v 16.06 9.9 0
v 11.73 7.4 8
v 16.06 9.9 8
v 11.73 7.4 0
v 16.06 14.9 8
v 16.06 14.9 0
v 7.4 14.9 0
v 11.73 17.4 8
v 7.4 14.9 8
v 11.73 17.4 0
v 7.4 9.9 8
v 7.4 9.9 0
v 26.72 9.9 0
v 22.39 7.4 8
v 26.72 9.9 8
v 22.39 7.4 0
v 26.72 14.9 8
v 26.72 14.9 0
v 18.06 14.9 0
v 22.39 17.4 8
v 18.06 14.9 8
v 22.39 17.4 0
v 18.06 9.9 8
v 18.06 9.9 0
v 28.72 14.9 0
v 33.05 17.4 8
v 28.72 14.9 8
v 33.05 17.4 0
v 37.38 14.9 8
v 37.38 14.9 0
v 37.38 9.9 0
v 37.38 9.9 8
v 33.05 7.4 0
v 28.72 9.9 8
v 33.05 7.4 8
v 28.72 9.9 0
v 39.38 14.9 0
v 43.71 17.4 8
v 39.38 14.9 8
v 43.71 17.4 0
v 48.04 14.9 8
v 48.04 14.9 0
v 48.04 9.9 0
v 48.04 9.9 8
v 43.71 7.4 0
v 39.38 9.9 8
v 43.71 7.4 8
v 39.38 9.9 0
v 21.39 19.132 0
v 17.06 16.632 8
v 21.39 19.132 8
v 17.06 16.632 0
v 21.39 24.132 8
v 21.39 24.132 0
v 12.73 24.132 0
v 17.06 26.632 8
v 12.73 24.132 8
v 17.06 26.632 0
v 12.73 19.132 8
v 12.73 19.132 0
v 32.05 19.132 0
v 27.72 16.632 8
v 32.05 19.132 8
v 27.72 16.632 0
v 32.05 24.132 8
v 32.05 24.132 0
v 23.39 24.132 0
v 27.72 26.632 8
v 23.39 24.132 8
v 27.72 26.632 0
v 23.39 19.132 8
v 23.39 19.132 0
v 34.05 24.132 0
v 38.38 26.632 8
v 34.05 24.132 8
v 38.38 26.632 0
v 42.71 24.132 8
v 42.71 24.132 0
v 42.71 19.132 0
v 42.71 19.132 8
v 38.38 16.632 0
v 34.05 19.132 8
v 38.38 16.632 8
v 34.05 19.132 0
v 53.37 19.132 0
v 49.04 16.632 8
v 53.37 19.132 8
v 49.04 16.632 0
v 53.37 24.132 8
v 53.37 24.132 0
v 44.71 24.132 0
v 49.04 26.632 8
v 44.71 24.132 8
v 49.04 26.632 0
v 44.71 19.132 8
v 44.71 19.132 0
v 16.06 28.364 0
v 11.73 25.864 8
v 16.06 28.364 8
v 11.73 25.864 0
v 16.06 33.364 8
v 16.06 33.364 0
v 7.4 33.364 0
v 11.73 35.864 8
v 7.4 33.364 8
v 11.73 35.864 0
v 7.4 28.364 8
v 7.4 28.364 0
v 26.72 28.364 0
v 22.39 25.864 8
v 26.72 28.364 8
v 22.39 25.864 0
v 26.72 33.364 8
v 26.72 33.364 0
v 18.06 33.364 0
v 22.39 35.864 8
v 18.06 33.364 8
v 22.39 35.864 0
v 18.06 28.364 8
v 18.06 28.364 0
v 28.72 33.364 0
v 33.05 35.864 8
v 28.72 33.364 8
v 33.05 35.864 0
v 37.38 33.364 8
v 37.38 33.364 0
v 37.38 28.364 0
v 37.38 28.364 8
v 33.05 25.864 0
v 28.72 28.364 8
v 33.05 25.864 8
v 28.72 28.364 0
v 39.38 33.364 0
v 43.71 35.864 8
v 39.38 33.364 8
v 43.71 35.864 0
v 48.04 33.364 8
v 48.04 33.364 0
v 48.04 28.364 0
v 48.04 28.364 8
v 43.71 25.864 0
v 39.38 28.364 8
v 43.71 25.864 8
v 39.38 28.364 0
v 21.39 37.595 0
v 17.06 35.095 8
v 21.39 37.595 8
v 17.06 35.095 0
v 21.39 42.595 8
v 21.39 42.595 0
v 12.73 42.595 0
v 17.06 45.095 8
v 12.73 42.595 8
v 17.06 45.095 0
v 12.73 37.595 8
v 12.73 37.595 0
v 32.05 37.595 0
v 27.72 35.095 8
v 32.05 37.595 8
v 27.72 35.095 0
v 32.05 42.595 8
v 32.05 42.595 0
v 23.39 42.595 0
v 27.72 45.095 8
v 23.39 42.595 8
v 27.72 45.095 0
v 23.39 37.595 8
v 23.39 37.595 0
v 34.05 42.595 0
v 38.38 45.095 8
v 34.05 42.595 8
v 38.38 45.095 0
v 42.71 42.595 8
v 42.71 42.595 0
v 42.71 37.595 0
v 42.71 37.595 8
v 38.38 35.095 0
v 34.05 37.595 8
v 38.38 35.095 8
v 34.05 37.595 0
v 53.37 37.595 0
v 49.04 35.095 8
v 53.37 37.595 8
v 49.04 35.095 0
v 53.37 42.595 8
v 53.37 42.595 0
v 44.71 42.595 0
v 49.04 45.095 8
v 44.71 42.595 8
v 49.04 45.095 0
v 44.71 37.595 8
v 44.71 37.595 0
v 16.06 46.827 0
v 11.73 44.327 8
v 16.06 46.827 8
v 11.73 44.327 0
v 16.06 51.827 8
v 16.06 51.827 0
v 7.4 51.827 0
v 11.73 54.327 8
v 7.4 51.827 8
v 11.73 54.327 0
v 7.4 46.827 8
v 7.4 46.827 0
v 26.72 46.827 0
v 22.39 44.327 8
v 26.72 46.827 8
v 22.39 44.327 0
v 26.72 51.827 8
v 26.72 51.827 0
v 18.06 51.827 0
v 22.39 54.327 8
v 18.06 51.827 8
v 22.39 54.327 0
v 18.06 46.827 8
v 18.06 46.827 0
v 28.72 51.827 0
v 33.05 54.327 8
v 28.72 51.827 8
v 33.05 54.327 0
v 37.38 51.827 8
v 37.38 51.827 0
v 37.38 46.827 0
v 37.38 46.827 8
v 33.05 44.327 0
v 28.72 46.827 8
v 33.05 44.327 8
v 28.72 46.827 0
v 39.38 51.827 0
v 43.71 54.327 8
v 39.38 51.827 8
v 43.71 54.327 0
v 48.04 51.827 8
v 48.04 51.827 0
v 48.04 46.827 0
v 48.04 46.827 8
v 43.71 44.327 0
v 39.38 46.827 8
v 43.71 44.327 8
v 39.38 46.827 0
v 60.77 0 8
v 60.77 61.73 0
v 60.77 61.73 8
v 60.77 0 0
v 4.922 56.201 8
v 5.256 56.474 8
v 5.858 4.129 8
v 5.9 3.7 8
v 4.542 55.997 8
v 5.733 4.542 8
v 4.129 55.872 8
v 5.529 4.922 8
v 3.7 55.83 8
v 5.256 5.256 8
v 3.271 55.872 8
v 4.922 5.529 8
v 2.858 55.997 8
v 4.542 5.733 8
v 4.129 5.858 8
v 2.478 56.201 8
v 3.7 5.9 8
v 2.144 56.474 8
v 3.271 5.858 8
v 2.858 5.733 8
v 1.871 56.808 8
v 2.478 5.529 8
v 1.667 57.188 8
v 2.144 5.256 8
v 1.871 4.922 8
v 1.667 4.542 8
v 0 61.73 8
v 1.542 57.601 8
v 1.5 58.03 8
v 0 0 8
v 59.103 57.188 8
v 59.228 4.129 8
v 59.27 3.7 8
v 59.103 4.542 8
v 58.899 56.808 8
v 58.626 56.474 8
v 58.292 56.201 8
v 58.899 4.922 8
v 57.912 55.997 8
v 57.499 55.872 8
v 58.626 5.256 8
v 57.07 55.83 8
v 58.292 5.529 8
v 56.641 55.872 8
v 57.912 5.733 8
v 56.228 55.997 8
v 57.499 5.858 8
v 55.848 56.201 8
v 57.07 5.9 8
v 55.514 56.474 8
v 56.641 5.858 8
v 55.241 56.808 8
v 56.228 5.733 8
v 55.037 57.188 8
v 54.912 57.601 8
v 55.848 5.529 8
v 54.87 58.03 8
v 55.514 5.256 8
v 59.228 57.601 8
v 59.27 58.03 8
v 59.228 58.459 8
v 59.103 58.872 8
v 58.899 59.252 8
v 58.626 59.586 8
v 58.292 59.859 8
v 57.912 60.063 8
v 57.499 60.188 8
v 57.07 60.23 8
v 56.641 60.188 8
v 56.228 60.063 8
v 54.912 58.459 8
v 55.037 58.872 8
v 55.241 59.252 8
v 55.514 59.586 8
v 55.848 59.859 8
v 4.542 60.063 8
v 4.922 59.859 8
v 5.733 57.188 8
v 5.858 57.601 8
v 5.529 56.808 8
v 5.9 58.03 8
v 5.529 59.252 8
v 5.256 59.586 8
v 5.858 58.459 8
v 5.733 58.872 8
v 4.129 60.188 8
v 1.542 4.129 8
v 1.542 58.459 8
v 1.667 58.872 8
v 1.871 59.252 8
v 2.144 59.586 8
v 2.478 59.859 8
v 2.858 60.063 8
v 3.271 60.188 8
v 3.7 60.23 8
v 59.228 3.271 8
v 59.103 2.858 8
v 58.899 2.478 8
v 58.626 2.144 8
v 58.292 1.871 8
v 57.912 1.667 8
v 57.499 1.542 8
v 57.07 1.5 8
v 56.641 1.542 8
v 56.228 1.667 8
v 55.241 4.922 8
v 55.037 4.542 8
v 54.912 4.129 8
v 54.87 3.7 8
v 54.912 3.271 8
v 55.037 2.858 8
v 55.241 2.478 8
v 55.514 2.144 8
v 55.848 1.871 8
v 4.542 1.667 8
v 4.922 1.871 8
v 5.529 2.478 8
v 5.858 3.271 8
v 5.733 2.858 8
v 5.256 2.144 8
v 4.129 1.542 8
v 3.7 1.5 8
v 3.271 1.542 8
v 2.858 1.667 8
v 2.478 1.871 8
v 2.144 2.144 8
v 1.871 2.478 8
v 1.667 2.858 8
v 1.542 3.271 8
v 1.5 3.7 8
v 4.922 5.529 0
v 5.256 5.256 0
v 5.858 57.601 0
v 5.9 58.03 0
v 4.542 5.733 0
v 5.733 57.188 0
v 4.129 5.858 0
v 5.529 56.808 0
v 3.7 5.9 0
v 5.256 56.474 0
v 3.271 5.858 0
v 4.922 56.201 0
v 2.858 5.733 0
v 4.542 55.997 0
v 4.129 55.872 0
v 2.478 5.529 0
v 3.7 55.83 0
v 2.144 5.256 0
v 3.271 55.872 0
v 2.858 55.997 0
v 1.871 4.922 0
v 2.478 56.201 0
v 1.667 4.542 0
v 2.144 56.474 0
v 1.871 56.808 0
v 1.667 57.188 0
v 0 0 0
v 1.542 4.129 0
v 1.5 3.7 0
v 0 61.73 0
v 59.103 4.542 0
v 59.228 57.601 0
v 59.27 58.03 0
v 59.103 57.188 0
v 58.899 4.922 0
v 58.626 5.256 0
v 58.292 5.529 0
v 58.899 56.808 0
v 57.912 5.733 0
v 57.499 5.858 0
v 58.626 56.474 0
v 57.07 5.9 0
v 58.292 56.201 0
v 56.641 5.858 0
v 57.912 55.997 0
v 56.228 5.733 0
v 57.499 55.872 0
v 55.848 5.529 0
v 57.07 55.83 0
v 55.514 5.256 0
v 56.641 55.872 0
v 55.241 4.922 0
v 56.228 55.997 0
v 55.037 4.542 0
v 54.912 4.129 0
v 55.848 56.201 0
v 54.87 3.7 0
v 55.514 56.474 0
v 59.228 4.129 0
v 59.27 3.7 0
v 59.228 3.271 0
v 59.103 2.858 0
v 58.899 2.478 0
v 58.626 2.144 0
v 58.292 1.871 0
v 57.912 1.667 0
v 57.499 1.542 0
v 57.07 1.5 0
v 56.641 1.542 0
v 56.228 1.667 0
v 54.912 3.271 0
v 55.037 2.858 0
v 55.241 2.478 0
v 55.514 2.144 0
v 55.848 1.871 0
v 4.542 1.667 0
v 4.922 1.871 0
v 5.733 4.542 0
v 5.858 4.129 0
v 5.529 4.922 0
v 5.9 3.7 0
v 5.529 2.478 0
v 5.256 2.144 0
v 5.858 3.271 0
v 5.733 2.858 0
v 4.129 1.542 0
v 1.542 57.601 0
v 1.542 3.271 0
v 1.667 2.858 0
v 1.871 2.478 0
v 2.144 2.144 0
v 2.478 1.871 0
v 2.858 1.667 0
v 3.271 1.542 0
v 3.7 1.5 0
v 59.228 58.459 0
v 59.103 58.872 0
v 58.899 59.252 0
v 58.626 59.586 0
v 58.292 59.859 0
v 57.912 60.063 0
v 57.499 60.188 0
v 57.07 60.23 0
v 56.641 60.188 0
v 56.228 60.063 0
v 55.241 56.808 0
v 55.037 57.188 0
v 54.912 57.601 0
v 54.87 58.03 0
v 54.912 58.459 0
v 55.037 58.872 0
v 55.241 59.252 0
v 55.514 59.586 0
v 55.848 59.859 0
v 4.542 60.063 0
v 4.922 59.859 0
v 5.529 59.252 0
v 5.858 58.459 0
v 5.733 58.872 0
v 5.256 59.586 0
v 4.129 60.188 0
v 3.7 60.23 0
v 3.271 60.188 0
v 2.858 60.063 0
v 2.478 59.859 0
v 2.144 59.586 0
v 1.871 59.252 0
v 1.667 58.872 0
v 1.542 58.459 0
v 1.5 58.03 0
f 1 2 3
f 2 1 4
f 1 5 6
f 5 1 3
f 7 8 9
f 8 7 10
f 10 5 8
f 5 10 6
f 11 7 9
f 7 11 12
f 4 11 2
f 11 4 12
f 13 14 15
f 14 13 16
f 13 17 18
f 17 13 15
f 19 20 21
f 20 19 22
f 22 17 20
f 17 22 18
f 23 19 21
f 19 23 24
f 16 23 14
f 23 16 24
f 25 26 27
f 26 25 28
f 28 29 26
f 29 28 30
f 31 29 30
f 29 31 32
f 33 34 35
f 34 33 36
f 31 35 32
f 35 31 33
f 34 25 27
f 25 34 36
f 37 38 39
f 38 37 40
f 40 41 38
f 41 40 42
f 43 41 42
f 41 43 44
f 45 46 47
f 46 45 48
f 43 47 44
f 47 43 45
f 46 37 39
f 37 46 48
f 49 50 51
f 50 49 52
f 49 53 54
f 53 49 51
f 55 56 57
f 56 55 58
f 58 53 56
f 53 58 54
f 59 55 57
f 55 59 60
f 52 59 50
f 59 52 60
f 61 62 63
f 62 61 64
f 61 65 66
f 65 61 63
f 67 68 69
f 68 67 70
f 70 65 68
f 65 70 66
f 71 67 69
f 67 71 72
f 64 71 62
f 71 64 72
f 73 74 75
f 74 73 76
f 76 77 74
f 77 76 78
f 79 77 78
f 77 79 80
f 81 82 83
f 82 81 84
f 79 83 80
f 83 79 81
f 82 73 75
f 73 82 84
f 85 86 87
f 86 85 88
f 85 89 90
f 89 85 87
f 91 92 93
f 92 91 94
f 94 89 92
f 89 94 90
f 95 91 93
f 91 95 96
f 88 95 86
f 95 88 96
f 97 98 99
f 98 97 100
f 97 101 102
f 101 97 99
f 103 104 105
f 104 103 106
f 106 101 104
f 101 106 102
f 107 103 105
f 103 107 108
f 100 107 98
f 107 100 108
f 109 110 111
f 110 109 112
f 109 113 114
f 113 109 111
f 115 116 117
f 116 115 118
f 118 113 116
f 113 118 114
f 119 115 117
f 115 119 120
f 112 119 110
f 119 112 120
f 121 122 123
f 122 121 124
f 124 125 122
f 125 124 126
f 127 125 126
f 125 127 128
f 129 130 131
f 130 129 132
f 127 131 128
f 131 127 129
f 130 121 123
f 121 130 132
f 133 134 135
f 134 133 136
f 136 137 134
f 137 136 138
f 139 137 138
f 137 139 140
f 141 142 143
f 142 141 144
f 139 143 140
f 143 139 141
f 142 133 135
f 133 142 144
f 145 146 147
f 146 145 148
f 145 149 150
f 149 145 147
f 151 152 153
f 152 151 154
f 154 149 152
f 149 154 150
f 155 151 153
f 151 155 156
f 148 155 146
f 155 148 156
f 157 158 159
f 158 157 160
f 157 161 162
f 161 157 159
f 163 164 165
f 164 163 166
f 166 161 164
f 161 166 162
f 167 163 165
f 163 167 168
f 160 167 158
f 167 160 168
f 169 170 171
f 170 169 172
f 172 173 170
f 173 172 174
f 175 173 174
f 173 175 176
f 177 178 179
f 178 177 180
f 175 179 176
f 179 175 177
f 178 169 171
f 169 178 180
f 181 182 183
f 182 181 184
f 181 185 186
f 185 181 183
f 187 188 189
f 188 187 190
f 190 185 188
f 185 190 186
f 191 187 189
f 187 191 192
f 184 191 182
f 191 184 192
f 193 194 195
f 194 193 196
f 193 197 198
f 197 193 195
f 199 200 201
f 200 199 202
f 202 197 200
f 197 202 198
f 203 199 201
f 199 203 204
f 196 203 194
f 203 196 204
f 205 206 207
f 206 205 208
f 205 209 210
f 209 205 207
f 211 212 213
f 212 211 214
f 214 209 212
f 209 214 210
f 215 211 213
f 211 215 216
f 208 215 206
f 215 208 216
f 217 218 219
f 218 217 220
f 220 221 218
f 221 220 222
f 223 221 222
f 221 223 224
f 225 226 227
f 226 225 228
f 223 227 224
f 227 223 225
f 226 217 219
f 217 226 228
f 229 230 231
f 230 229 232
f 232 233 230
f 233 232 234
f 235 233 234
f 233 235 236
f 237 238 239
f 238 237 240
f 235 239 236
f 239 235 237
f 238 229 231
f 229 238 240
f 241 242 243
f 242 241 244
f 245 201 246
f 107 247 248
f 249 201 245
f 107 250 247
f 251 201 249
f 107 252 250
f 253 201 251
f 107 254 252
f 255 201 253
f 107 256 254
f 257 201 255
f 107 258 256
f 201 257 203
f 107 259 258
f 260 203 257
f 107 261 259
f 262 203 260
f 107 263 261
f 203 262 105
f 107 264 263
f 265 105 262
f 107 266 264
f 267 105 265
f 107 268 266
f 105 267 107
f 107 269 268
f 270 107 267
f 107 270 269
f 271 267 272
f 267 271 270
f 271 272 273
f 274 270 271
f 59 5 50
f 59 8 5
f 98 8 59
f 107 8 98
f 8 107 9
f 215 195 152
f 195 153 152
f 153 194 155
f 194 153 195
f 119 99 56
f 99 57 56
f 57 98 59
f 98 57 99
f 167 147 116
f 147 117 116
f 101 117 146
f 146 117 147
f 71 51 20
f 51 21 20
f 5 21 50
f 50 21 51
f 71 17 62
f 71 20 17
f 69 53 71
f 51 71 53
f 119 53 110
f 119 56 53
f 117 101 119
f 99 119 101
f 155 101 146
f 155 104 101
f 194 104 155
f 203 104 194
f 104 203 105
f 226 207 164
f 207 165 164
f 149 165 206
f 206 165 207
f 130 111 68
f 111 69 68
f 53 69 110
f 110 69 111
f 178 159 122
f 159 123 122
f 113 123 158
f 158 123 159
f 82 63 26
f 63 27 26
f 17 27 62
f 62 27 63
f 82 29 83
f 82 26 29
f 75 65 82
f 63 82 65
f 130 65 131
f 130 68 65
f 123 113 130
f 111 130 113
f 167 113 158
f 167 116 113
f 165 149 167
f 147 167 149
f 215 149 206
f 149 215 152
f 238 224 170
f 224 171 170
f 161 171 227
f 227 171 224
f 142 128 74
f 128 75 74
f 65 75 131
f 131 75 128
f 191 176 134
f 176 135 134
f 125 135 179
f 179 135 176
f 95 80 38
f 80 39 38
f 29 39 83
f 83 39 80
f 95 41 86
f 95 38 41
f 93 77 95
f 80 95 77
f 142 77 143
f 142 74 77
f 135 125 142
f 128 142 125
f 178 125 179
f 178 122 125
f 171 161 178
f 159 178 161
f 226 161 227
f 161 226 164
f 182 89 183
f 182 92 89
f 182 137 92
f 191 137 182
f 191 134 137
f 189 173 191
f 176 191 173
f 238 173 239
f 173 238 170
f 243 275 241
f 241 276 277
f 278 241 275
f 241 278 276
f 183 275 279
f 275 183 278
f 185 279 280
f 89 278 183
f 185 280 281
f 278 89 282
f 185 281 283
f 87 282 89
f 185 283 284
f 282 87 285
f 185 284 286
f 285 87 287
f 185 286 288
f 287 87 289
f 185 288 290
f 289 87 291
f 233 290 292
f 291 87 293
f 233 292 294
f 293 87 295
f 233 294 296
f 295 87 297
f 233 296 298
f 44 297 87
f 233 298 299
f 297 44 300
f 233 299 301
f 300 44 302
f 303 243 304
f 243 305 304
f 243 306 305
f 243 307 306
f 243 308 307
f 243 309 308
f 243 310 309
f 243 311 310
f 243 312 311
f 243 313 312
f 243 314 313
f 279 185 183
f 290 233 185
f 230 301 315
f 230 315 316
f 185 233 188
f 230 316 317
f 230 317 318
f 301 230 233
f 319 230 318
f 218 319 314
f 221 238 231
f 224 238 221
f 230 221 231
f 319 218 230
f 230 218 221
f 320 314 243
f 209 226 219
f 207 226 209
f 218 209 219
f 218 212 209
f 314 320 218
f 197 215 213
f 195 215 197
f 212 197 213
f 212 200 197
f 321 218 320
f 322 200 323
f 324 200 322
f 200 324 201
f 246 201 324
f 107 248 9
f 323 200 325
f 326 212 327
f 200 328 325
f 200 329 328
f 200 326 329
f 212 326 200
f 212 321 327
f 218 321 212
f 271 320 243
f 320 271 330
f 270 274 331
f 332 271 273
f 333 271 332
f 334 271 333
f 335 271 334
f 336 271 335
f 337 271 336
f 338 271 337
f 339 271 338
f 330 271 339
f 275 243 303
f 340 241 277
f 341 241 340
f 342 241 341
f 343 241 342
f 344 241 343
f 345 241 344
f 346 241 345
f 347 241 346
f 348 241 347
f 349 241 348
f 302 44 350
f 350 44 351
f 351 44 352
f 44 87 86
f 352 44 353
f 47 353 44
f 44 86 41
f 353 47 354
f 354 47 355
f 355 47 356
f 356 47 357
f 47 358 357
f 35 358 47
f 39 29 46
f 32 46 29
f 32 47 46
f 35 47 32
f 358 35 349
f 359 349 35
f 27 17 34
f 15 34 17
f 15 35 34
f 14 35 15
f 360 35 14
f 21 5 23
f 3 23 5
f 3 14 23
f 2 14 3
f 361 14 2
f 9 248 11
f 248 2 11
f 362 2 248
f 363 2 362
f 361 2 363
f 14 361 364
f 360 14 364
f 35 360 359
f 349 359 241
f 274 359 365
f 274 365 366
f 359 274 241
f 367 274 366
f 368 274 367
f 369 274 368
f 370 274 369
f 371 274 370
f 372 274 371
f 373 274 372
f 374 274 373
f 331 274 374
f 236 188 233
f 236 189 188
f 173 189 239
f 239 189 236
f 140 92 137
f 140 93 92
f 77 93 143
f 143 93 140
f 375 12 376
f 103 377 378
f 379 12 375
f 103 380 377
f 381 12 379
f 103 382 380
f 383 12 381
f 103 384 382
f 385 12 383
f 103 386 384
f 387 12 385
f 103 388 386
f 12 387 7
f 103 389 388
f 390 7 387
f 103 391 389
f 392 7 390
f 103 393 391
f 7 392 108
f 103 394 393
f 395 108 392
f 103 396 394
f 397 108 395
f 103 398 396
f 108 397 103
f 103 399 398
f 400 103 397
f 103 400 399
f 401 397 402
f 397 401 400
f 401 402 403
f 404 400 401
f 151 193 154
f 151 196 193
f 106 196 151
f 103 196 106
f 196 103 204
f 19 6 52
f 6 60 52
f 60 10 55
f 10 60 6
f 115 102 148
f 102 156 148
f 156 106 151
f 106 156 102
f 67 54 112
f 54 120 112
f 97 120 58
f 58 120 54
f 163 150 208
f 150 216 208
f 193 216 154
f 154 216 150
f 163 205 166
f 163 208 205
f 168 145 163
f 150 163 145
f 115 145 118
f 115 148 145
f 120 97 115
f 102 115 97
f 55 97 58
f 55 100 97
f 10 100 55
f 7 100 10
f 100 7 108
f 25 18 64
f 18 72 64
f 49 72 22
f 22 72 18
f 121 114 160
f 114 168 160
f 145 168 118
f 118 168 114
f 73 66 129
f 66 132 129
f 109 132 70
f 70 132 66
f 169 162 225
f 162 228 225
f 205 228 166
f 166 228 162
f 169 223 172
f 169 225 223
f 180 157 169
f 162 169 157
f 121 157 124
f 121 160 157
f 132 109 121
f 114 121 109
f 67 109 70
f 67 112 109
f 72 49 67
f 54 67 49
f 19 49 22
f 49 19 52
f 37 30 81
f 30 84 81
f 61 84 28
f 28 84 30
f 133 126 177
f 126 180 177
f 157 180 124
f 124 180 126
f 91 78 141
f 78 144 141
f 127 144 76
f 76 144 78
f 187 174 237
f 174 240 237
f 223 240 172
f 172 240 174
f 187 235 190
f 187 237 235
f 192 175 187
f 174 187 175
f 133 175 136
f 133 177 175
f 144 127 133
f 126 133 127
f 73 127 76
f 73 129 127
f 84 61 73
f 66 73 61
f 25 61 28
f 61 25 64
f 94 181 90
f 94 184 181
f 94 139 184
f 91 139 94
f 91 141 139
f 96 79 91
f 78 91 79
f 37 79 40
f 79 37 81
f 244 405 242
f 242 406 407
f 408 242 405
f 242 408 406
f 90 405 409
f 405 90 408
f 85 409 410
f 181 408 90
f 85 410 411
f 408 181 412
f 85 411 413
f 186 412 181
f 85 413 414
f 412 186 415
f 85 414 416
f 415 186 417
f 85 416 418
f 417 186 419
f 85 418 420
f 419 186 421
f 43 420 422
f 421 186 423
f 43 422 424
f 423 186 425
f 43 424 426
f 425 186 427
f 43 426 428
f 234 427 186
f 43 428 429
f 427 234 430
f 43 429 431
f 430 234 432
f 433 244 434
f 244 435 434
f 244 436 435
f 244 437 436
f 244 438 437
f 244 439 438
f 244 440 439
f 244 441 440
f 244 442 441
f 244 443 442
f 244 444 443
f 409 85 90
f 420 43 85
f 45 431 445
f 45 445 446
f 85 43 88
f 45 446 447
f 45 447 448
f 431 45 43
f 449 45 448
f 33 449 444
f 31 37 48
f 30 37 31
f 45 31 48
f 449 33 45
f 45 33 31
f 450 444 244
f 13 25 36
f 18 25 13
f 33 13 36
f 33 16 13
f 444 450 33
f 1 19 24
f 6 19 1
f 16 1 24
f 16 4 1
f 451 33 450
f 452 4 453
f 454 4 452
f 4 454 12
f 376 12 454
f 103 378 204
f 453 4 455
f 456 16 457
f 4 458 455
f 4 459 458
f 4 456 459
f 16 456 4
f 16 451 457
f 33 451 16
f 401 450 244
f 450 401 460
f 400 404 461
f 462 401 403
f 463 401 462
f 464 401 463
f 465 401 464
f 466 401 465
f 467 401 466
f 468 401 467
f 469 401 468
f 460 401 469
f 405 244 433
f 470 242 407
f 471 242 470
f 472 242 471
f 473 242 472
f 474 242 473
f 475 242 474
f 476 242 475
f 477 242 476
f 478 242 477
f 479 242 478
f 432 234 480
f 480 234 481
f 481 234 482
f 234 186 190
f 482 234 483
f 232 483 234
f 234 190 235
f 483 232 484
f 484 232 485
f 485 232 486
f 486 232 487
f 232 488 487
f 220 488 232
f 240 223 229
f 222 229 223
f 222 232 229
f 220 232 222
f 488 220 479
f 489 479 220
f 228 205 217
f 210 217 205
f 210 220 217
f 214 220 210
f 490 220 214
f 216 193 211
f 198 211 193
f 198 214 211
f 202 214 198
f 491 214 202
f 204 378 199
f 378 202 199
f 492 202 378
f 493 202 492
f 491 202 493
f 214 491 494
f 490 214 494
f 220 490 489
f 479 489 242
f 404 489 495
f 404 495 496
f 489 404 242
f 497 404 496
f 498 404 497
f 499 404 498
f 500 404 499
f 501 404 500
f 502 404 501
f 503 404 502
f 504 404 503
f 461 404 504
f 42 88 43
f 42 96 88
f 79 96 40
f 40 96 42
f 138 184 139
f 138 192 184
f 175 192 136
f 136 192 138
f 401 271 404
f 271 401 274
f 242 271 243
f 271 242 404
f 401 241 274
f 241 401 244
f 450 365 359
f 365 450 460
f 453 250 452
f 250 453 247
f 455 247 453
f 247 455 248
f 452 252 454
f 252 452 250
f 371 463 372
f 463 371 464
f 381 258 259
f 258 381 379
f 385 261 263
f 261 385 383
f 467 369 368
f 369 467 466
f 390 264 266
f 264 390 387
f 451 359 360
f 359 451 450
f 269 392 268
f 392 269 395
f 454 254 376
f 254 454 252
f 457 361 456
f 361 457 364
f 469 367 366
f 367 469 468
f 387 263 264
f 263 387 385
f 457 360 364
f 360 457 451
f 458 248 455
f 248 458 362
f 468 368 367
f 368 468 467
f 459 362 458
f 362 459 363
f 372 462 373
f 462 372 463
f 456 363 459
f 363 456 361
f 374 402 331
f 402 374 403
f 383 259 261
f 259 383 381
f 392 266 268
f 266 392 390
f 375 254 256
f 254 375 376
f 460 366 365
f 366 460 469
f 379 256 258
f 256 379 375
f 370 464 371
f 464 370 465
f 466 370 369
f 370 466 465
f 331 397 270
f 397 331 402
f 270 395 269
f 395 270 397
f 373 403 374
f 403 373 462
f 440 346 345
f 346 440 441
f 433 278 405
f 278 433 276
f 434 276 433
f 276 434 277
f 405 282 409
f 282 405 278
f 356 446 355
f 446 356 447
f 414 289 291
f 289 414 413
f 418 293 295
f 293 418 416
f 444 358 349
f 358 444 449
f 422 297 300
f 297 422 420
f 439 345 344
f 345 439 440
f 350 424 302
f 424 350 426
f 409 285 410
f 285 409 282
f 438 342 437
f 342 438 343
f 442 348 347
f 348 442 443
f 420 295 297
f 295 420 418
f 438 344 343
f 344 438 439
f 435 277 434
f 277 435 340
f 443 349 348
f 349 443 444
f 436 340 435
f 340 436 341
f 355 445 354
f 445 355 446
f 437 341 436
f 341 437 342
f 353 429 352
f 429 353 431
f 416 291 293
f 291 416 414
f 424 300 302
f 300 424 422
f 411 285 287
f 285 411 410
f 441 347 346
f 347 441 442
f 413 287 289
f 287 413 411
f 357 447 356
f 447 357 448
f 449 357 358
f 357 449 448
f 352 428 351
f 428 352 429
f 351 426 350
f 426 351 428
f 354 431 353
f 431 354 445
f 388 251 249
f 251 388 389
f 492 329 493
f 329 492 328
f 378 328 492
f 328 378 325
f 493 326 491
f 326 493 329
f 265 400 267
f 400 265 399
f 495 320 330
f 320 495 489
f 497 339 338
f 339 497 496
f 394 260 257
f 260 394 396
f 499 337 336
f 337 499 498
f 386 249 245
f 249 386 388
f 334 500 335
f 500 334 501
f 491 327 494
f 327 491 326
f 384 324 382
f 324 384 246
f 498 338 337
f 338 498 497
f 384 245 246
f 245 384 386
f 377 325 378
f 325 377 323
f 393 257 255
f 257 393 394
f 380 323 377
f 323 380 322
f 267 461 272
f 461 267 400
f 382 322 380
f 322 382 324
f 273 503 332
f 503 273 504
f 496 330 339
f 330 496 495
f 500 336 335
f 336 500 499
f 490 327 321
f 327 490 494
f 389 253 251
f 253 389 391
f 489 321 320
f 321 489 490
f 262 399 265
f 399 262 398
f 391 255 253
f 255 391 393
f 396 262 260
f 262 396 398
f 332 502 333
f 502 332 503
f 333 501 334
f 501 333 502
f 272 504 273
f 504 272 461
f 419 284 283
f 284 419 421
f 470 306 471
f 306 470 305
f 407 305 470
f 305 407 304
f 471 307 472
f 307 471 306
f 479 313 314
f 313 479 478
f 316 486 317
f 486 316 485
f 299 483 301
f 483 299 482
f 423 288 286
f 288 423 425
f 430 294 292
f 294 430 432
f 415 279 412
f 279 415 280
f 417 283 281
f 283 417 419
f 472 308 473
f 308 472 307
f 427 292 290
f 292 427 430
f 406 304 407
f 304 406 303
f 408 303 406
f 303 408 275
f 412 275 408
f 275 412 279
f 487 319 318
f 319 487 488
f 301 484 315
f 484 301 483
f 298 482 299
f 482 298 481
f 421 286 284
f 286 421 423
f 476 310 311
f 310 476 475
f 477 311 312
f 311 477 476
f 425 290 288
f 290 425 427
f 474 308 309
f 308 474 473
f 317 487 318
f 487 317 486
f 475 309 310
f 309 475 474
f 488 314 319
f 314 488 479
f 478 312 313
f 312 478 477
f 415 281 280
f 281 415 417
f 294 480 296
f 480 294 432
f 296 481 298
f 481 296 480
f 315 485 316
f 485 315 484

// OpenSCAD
$fn = 32;

// ----------------------------------------------------------------------
// Honeycomb panel: 60.77 x 61.73 mm, 20 cells of 10 mm
// ----------------------------------------------------------------------

// --- parameters (mm) ---
panel_w = 60.77;          // panel width
panel_d = 61.73;          // panel depth
thick = 8;                // panel thickness
cell_r = 5;               // hex cell circumradius
pitch = 10.66;            // hex cell pitch (centre to centre)
web = 2;                  // web between the cells
columns = 4;              // columns of cells
rows = 5;                 // rows of cells
cell_count = 20;          // total cells
shift_x = 11.73;          // first cell offset in x
shift_y = 12.4;           // first cell offset in y
mount_d = 4.4;            // corner mounting holes
hole_off = 3.7;           // mounting hole offset from the corners

difference() {
  union() {
    cube([panel_w, panel_d, thick]);
  }
  /* hexagonal cells, point-up, cut right through the plate */
  for (row = [0 : rows - 1]) {
    for (col = [0 : columns - 1]) {
      translate([shift_x + col * pitch + (row % 2) * pitch / 2, shift_y + row * pitch * 0.866025, -2.5]) rotate([0, 0, 30]) cylinder(h = thick + 5, d = 2 * cell_r, $fn = 6);
    }
  }
  /* corner mounting holes, clear of the outer cell web */
  translate([3.7, 3.7, -2.5]) cylinder(h = thick + 5, d = mount_d);
  translate([57.07, 3.7, -2.5]) cylinder(h = thick + 5, d = mount_d);
  translate([3.7, 58.03, -2.5]) cylinder(h = thick + 5, d = mount_d);
  translate([57.07, 58.03, -2.5]) cylinder(h = thick + 5, d = mount_d);
}
